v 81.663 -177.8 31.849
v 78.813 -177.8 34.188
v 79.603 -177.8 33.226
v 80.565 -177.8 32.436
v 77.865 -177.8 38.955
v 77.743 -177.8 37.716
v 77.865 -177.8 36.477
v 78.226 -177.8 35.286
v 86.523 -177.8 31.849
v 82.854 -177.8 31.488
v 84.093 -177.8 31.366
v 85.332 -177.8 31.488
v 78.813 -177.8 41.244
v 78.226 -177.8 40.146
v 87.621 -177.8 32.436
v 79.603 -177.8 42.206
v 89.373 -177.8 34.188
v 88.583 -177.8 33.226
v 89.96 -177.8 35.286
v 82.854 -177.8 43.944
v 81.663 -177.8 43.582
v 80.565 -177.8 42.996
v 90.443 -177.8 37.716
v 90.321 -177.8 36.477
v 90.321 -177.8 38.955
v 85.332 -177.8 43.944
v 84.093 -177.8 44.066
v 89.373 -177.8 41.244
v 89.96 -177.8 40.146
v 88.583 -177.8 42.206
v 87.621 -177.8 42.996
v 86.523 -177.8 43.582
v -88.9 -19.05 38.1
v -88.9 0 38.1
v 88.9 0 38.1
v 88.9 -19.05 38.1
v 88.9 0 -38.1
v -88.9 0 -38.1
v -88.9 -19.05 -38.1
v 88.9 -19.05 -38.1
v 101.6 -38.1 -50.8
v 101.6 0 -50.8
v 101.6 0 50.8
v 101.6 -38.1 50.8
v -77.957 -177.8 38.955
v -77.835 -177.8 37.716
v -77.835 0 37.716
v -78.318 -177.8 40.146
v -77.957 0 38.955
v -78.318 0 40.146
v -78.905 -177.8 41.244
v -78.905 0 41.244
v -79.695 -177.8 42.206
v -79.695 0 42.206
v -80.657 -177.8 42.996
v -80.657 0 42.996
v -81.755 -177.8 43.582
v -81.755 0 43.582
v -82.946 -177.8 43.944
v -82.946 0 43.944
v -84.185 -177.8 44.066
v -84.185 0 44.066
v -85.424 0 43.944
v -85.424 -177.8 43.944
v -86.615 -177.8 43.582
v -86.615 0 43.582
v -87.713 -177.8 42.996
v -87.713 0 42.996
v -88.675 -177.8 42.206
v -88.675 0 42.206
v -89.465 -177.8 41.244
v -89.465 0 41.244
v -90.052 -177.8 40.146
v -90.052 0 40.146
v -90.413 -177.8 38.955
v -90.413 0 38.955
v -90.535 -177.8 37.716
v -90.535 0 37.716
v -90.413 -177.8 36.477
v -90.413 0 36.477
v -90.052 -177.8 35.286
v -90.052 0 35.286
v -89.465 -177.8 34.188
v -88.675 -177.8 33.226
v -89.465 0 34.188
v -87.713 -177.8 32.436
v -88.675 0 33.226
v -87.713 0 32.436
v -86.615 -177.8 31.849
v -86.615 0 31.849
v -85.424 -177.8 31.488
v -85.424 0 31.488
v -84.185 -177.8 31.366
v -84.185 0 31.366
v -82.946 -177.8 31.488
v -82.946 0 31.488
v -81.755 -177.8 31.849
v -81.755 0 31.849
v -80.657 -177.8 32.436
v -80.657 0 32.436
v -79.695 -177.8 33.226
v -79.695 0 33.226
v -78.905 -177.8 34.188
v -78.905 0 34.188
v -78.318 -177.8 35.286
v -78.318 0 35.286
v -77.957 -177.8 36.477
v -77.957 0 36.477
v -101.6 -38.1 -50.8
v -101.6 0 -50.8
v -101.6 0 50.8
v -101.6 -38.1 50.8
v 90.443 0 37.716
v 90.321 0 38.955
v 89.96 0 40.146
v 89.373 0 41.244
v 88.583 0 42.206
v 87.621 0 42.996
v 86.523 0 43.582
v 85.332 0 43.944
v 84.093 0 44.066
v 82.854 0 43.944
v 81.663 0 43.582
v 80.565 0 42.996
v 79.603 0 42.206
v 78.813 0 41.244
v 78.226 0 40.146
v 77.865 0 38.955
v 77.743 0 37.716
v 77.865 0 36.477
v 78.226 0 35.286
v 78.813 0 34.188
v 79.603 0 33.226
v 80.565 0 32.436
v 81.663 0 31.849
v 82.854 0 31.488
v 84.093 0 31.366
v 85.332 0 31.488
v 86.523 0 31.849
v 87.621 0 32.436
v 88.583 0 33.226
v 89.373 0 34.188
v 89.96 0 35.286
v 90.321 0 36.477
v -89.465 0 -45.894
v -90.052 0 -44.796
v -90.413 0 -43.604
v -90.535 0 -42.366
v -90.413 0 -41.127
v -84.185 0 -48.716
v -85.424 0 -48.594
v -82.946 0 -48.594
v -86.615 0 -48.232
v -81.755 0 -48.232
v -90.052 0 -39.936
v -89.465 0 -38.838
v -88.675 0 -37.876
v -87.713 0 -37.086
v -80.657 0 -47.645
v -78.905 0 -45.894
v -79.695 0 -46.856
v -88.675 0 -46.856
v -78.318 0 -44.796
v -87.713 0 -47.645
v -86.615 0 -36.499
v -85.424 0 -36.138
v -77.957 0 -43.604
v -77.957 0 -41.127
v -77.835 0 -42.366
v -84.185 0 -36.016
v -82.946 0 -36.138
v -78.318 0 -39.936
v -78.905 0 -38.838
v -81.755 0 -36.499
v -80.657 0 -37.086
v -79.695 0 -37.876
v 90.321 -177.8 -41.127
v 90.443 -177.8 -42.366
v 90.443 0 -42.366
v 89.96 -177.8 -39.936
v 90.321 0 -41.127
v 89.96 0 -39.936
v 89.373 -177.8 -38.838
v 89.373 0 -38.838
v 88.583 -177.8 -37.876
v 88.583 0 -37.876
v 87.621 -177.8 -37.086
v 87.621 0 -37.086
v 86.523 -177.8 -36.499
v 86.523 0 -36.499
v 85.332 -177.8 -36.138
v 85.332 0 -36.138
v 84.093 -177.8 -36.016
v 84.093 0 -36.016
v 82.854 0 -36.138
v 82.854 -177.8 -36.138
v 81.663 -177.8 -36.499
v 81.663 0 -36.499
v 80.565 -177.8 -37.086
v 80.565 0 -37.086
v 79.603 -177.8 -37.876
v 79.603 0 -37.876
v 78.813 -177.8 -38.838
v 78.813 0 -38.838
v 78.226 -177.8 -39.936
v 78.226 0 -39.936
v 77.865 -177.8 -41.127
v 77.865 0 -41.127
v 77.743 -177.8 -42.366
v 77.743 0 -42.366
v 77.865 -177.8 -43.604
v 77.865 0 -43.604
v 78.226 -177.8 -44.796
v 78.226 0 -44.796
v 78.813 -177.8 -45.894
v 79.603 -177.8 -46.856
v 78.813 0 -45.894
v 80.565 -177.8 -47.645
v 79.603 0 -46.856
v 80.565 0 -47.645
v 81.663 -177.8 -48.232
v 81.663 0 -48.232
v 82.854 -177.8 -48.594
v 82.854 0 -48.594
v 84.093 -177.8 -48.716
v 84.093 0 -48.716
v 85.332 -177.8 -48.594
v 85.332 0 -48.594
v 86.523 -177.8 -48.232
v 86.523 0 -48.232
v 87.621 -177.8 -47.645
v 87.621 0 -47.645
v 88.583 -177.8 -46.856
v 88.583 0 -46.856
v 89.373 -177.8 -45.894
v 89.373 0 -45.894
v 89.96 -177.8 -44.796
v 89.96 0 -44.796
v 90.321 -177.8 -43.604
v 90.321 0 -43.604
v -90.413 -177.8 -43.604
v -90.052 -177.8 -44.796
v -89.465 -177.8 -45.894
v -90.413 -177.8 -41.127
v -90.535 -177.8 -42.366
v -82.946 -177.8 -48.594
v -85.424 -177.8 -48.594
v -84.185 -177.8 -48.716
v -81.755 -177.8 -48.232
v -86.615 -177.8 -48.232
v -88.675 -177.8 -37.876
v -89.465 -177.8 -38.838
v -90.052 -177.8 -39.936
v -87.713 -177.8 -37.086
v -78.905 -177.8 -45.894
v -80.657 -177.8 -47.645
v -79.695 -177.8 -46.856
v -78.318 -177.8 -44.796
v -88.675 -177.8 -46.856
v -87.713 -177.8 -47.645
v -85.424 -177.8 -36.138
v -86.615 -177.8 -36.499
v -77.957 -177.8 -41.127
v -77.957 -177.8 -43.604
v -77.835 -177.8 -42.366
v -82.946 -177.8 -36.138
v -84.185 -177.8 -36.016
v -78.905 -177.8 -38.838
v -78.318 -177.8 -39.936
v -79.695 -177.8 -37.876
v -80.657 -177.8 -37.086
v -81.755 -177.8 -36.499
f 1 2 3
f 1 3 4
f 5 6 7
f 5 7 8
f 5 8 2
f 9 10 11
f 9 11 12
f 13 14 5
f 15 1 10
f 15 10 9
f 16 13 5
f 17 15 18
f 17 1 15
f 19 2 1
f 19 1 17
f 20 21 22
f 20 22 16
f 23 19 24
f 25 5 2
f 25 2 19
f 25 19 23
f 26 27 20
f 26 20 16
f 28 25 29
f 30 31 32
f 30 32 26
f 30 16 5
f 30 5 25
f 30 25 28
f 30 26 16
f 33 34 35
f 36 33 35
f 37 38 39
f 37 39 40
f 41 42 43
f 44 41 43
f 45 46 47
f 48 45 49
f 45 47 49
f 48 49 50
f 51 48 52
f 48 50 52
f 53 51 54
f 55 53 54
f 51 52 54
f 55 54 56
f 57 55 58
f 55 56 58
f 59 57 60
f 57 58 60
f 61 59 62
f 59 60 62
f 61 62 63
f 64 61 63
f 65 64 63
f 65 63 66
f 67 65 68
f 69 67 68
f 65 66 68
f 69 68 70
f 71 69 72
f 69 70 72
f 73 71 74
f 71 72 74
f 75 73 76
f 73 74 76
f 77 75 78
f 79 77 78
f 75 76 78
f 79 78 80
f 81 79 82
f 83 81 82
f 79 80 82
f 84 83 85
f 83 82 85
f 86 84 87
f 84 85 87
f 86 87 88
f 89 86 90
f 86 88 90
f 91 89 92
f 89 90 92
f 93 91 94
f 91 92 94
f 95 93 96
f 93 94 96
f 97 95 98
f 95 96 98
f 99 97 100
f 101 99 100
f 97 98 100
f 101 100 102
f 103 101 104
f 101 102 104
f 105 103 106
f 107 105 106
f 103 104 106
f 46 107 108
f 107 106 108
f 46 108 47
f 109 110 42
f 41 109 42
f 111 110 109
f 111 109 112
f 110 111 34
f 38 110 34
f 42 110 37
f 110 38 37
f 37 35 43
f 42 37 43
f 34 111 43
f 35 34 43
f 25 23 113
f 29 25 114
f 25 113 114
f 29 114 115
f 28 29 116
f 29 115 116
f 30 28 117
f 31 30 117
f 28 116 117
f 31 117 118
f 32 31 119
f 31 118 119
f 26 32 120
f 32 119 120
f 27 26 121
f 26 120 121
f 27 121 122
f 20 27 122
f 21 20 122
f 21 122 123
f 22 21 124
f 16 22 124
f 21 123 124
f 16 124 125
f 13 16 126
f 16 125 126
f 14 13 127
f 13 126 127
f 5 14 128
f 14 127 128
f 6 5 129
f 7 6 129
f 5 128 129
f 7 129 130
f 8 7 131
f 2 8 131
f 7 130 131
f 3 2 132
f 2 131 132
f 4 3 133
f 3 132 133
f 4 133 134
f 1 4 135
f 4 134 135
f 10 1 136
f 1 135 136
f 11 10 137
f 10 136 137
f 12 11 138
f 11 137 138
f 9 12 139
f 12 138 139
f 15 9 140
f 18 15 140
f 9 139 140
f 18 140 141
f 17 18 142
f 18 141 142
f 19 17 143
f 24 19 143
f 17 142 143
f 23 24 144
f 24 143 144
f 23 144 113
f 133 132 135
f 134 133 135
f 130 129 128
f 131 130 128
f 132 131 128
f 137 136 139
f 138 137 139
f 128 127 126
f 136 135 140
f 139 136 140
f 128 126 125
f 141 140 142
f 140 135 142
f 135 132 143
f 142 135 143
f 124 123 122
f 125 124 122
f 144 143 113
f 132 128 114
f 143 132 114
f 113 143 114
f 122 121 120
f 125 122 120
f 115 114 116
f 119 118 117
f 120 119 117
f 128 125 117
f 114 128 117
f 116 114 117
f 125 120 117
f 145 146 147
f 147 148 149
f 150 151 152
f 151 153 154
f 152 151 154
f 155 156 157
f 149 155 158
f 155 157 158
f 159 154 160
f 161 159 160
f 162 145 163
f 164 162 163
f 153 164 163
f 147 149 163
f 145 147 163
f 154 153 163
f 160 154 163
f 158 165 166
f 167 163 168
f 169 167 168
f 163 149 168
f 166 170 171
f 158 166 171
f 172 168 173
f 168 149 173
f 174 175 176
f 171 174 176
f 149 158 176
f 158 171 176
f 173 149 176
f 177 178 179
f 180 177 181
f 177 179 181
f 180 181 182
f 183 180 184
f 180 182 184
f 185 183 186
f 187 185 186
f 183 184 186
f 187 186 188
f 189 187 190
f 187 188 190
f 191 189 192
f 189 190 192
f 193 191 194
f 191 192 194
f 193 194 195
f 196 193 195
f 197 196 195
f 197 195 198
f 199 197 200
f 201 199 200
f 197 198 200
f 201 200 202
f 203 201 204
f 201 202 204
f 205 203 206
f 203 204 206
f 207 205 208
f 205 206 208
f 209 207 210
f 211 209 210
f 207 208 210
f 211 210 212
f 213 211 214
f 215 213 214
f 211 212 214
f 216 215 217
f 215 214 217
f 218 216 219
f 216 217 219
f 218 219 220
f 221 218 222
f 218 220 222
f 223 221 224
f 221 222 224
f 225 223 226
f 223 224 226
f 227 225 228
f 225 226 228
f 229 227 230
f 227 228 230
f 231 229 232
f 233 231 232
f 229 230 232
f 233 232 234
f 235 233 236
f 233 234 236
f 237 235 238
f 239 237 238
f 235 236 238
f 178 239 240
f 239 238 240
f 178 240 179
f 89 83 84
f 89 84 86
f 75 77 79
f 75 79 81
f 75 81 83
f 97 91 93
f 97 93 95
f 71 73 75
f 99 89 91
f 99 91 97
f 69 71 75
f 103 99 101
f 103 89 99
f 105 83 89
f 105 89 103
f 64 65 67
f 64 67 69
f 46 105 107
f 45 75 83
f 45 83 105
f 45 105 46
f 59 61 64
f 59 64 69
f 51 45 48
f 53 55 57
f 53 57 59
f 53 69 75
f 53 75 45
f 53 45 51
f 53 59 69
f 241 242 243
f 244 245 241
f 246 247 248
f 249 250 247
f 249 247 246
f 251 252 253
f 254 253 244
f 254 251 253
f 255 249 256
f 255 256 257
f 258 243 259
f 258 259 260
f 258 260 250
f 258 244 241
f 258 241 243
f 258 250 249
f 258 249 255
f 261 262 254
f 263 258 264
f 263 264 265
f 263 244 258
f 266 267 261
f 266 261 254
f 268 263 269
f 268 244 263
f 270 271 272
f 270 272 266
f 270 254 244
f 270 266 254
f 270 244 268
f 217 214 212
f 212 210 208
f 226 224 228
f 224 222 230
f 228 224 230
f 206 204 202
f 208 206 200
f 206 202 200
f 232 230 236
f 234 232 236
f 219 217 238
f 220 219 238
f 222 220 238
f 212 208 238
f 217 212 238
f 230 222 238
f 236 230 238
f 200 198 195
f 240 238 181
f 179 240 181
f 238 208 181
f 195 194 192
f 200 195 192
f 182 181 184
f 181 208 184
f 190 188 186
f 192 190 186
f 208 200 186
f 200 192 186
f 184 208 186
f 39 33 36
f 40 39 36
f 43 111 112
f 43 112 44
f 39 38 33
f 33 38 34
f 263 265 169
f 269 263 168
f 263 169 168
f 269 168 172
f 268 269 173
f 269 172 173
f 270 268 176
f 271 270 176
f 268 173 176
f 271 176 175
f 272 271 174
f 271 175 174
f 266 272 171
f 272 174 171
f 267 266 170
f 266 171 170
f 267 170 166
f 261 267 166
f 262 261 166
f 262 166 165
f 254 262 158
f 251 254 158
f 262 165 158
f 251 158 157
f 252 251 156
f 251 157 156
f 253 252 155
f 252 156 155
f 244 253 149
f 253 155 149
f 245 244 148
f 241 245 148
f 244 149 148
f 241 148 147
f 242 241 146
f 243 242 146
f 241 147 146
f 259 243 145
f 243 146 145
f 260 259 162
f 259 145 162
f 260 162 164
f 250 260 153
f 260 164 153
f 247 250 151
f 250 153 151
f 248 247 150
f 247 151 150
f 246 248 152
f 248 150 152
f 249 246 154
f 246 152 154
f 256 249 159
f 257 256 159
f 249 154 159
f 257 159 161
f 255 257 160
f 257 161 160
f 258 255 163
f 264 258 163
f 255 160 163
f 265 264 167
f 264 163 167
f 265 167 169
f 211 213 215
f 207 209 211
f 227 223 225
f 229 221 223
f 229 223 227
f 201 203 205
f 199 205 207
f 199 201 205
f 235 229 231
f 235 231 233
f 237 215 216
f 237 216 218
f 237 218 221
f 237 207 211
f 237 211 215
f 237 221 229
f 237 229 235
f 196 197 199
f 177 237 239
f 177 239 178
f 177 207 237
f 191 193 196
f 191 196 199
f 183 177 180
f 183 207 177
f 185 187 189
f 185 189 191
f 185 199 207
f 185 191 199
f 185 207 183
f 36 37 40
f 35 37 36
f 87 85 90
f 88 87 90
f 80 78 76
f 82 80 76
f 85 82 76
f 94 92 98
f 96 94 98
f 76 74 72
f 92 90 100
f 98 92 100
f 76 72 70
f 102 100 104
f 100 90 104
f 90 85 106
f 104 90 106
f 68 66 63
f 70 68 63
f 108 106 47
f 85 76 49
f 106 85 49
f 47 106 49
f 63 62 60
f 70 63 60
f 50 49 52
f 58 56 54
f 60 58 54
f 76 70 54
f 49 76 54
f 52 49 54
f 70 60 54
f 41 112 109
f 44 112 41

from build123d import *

# Parameters (mm, degrees)
F0_W     = 203.2
F0_H     = 101.6
F0_R     = 6.35
F1_DEPTH = 38.1
F2_W     = 177.8
F2_H     = 76.2
F3_DEPTH = 19.05
F4_DEPTH = 177.8


with BuildPart() as f1:
    # F0 (on Front) → F1 (new body)
    with BuildSketch(Plane.XZ):
        Rectangle(F0_W, F0_H)
        with Locations((-84.18493, -42.365655)):
            Circle(F0_R, mode=Mode.SUBTRACT)
        with Locations((84.092915, -42.365655)):
            Circle(F0_R, mode=Mode.SUBTRACT)
        with Locations((-84.18493, 37.715852)):
            Circle(F0_R, mode=Mode.SUBTRACT)
        with Locations((84.092915, 37.715852)):
            Circle(F0_R, mode=Mode.SUBTRACT)
        with Locations((84.092915, -42.365655)):
            Circle(F0_R)
        with Locations((84.092915, 37.715852)):
            Circle(F0_R)
        with Locations((-84.18493, 37.715852)):
            Circle(F0_R)
        with Locations((-84.18493, -42.365655)):
            Circle(F0_R)
    extrude(amount=F1_DEPTH)

    # F2 (on Front) → F3 (cut)
    with BuildSketch(Plane.XZ):
        Rectangle(F2_W, F2_H)
    extrude(amount=F3_DEPTH, mode=Mode.SUBTRACT)


with BuildPart() as f4:
    # F0 (on Front) → F4 (new body)
    with BuildSketch(Plane.XZ):
        with Locations((-84.18493, -42.365655)):
            Circle(F0_R)
        with Locations((-84.18493, 37.715852)):
            Circle(F0_R)
        with Locations((84.092915, -42.365655)):
            Circle(F0_R)
        with Locations((84.092915, 37.715852)):
            Circle(F0_R)
    extrude(amount=F4_DEPTH)


solid = Compound([f1.part, f4.part])
